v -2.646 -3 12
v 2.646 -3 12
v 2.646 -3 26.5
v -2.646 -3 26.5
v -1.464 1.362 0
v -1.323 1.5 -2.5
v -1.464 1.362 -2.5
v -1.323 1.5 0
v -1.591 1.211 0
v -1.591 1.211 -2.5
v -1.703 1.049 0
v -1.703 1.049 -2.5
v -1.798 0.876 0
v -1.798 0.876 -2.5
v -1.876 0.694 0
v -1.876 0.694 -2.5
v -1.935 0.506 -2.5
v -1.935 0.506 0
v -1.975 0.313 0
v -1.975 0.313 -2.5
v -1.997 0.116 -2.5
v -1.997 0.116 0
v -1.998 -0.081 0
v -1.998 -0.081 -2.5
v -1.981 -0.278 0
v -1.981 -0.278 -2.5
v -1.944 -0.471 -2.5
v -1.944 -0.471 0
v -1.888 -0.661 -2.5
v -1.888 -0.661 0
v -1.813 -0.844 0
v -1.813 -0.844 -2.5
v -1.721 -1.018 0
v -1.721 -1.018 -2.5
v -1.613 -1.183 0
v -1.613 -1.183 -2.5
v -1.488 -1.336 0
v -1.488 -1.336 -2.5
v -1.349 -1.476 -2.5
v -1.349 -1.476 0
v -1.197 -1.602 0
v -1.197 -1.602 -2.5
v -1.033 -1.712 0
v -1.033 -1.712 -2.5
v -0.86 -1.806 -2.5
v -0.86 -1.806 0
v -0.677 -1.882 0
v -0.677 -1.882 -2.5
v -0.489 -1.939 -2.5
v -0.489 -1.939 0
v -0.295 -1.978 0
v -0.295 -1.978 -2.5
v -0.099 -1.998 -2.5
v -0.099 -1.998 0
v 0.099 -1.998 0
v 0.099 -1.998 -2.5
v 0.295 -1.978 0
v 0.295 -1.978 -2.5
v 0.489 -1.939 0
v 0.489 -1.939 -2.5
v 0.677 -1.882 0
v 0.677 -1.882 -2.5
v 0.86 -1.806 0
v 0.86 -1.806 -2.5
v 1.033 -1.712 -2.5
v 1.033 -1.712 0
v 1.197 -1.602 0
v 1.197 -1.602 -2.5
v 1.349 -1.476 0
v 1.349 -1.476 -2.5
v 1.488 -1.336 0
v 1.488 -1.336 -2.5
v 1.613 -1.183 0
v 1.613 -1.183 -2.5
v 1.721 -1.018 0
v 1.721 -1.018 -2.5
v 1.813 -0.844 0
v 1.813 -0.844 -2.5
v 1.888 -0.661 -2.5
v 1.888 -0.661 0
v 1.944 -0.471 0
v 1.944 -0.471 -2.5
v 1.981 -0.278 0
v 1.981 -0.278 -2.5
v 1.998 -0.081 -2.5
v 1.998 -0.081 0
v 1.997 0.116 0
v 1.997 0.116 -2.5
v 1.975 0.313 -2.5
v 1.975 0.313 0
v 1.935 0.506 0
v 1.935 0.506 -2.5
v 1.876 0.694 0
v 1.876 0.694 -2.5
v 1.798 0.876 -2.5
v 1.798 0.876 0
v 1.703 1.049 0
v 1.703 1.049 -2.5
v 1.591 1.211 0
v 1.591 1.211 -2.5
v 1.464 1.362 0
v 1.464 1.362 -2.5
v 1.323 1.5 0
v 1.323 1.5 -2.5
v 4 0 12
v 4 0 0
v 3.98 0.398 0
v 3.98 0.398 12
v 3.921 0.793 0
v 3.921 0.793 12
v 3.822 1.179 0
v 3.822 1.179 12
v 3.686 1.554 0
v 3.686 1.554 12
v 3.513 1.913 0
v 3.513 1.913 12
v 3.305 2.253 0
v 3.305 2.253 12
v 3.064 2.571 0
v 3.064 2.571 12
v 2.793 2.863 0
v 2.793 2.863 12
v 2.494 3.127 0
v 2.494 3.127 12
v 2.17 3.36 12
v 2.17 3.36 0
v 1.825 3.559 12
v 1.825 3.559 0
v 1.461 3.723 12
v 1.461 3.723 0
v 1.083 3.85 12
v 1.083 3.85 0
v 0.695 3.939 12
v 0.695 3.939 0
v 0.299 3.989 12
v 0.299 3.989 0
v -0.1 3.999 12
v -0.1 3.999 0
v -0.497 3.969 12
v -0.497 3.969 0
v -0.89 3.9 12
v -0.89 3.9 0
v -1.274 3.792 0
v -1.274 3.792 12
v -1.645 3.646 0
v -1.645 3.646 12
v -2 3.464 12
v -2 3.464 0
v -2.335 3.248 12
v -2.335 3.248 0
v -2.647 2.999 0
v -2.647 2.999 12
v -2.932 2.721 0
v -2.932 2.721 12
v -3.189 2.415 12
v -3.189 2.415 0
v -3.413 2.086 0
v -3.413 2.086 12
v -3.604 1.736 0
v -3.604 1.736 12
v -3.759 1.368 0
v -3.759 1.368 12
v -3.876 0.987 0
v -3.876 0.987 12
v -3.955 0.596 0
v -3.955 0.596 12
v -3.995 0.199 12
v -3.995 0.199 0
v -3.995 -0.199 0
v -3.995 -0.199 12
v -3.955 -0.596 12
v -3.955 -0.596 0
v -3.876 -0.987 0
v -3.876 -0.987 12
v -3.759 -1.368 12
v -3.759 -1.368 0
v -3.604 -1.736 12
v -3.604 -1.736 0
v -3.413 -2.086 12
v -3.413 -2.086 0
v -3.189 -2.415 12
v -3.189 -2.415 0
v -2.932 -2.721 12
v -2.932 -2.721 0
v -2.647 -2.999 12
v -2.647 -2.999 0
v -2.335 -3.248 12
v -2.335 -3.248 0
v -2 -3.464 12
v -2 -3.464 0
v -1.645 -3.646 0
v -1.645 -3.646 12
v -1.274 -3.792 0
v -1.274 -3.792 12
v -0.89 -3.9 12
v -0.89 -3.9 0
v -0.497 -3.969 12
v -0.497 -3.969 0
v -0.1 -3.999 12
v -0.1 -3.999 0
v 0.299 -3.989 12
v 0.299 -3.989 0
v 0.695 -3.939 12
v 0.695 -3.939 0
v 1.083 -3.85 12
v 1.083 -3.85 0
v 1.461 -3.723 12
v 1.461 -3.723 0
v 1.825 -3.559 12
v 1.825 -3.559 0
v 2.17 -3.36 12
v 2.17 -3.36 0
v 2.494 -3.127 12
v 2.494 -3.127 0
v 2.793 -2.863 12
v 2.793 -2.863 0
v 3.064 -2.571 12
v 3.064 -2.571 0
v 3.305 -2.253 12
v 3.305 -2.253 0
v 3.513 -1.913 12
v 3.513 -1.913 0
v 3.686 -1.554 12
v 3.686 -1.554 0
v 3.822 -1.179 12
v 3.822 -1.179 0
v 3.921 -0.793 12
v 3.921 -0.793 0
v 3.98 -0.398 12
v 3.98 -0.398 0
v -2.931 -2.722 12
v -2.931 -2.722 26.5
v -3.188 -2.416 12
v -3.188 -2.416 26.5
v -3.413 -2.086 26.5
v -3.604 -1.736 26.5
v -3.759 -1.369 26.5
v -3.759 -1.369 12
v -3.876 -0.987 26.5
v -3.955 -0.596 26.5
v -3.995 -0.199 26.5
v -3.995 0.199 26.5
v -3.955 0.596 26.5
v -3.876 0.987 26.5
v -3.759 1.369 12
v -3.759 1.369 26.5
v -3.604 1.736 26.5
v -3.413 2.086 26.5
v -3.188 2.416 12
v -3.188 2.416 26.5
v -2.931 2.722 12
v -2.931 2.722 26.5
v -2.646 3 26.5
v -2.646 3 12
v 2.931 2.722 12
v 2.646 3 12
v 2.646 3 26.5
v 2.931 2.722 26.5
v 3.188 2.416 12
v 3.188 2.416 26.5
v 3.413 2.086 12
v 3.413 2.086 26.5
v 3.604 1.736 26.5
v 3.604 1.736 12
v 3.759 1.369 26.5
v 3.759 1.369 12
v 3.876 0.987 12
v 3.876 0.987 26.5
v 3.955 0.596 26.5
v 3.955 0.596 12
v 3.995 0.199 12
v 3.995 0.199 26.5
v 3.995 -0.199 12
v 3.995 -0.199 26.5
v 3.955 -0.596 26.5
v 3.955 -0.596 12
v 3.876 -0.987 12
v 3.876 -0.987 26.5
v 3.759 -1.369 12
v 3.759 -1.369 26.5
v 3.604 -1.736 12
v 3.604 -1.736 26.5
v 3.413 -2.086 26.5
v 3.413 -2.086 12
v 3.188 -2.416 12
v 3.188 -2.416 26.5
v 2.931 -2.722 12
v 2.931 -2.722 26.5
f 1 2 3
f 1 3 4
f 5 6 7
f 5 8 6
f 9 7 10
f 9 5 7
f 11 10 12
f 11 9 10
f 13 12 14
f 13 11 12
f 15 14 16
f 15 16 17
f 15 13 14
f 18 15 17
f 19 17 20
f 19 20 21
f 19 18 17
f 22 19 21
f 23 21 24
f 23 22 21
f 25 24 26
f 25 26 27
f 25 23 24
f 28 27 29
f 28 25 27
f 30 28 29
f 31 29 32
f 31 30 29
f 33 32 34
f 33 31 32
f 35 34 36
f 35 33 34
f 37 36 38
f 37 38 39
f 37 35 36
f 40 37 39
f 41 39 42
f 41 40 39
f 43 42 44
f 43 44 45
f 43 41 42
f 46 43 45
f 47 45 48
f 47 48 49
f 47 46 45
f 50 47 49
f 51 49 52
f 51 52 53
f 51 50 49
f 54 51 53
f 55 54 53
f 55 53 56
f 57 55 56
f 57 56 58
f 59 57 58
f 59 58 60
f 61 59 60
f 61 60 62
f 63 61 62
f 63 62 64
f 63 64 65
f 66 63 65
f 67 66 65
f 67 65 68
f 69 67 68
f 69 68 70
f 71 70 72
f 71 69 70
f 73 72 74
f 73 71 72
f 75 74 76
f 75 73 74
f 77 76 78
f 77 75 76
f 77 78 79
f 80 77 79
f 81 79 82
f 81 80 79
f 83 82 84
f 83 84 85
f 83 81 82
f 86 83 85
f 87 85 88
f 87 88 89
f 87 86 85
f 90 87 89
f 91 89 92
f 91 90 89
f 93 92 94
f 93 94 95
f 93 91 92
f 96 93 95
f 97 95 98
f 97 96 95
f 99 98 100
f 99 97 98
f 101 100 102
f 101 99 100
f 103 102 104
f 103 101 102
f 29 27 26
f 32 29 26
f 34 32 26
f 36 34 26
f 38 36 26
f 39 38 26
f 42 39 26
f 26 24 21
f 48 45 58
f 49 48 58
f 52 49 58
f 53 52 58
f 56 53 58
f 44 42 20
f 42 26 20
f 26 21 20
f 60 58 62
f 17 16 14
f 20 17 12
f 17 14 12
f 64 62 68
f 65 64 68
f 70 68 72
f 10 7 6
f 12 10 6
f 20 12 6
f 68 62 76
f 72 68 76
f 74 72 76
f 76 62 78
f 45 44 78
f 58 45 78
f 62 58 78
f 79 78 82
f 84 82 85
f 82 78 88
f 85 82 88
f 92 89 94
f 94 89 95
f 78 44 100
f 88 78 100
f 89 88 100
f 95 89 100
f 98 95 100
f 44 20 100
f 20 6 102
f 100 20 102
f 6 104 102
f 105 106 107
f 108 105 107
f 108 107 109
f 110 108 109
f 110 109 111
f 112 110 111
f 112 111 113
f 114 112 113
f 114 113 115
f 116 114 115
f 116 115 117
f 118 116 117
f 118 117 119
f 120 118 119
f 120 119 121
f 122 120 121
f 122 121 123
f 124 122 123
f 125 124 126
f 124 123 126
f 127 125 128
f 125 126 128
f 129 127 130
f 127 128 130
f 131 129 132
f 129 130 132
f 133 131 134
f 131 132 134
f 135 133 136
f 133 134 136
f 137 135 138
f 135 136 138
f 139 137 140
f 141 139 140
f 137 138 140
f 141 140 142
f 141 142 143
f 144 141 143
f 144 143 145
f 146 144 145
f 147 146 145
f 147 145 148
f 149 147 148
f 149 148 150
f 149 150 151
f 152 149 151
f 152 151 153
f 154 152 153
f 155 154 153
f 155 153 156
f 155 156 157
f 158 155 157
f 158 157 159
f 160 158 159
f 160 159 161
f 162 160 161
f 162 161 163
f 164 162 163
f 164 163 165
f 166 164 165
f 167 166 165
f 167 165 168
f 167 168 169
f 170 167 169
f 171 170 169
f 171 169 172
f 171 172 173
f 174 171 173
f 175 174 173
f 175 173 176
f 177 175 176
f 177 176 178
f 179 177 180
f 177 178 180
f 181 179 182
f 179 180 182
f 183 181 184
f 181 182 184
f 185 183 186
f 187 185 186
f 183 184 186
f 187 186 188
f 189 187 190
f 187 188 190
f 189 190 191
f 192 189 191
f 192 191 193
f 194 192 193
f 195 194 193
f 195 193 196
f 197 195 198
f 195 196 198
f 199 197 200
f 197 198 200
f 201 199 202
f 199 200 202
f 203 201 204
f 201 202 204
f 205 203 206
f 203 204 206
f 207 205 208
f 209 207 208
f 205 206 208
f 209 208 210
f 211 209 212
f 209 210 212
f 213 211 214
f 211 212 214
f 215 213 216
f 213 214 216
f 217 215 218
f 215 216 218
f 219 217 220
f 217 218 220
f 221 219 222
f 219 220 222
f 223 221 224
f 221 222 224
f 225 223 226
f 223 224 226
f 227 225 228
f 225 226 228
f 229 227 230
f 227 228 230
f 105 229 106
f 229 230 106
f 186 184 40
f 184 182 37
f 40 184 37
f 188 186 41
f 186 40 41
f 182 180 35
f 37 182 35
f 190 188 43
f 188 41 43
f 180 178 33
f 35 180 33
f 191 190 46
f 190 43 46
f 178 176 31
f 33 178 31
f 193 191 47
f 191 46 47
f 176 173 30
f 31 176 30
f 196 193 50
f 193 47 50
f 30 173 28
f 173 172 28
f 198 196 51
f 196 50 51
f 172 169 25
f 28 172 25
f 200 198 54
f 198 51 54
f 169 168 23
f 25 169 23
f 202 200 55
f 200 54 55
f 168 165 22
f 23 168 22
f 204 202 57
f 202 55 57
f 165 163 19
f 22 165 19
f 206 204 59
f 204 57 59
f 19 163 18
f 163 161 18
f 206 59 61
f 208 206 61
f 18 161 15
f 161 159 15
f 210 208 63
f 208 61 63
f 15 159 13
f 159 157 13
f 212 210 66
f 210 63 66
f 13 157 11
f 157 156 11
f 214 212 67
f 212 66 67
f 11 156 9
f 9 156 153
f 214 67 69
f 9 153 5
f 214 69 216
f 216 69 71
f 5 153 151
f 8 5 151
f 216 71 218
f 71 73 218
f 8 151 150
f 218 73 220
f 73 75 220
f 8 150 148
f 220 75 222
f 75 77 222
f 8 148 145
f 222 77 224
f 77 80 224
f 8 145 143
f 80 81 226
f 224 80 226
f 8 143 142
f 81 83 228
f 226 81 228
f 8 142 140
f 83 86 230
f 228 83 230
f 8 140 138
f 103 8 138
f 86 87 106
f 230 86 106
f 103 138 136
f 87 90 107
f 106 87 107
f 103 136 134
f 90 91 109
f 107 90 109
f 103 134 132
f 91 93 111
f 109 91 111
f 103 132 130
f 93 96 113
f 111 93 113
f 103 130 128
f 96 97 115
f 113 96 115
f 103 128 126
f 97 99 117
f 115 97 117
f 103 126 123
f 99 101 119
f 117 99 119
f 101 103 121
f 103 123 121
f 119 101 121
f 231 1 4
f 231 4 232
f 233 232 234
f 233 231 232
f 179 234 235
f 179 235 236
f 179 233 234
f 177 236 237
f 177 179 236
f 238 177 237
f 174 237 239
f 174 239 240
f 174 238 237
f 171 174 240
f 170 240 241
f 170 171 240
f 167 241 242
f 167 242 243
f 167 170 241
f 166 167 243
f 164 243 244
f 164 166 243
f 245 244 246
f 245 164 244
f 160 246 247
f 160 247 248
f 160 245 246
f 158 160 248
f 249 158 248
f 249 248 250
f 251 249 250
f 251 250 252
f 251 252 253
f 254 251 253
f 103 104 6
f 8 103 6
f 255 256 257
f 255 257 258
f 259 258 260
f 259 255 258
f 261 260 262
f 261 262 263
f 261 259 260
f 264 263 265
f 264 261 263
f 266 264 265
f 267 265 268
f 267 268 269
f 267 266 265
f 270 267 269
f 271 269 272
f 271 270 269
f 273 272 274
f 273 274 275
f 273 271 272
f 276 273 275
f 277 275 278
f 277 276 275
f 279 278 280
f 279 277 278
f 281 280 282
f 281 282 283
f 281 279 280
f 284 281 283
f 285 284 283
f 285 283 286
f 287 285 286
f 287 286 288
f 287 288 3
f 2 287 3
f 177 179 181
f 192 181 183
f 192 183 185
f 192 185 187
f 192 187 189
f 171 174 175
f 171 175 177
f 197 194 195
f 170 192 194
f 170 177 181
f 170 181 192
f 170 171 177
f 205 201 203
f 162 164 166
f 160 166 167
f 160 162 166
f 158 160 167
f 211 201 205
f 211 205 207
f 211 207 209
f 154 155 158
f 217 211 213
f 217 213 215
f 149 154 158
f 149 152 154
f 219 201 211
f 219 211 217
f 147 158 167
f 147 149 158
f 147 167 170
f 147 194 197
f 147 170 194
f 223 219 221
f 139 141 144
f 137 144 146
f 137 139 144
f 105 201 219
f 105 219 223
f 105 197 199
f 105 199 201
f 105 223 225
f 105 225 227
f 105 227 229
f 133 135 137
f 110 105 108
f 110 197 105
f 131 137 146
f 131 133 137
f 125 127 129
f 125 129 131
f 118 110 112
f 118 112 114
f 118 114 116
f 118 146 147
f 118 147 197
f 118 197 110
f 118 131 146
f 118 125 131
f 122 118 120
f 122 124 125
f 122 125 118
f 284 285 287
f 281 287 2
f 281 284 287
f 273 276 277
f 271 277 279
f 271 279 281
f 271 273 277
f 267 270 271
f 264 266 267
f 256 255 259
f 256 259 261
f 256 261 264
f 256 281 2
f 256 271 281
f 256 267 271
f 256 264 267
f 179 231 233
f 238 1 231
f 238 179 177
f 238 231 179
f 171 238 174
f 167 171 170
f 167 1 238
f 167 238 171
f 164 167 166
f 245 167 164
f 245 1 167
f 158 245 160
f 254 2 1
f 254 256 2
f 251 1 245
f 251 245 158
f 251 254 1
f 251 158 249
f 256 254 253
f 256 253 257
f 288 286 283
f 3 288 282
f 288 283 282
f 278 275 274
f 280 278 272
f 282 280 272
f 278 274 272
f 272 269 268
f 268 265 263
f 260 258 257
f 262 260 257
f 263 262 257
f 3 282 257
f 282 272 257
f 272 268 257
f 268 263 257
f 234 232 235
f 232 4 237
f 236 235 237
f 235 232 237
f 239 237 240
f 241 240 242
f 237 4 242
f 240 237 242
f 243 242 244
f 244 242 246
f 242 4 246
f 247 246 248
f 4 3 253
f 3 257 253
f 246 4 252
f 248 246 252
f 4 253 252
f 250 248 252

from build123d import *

# Parameters (mm, degrees)
SKETCH1_R           = 4
BOSS_EXTRUDE1_DEPTH = 12
SKETCH1_4_R         = 2
BOSS_EXTRUDE2_DEPTH = 2.5
BOSS_EXTRUDE3_DEPTH = 14.5
CUT_EXTRUDE1_START  = -2.5
CUT_EXTRUDE1_DEPTH  = 2.5


with BuildPart() as part:
    # Sketch1 → Boss-Extrude1 (new body)
    with BuildSketch(Plane.XY):
        Circle(SKETCH1_R)
    extrude(amount=BOSS_EXTRUDE1_DEPTH)

    # Sketch1<4> → Boss-Extrude2 (add)
    with BuildSketch(Plane.XY):
        Circle(SKETCH1_4_R)
    extrude(amount=-BOSS_EXTRUDE2_DEPTH)

    # Sketch3 → Cut-Extrude1 (cut)
    with BuildSketch(Plane(origin=(0, 0, -2.5), x_dir=(-1, 0, 0), z_dir=(0, 0, -1)).offset(CUT_EXTRUDE1_START)):
        with BuildLine():
            ThreePointArc((1.322875656, 1.5), (0, 2), (-1.322875656, 1.5))
            Line((-1.322875656, 1.5), (1.322875656, 1.5))
        make_face()
    extrude(amount=CUT_EXTRUDE1_DEPTH, mode=Mode.SUBTRACT)


with BuildPart() as body_2:
    # Sketch2 → Boss-Extrude3 (new body)
    with BuildSketch(Plane.XY.offset(12)):
        with BuildLine():
            Line((-2.645751311, 3), (2.645751311, 3))
            ThreePointArc((2.645751311, 3), (4, 0), (2.645751311, -3))
            Line((2.645751311, -3), (-2.645751311, -3))
            ThreePointArc((-2.645751311, -3), (-4, 0), (-2.645751311, 3))
        make_face()
    extrude(amount=BOSS_EXTRUDE3_DEPTH)


solid = Compound([part.part, body_2.part])
